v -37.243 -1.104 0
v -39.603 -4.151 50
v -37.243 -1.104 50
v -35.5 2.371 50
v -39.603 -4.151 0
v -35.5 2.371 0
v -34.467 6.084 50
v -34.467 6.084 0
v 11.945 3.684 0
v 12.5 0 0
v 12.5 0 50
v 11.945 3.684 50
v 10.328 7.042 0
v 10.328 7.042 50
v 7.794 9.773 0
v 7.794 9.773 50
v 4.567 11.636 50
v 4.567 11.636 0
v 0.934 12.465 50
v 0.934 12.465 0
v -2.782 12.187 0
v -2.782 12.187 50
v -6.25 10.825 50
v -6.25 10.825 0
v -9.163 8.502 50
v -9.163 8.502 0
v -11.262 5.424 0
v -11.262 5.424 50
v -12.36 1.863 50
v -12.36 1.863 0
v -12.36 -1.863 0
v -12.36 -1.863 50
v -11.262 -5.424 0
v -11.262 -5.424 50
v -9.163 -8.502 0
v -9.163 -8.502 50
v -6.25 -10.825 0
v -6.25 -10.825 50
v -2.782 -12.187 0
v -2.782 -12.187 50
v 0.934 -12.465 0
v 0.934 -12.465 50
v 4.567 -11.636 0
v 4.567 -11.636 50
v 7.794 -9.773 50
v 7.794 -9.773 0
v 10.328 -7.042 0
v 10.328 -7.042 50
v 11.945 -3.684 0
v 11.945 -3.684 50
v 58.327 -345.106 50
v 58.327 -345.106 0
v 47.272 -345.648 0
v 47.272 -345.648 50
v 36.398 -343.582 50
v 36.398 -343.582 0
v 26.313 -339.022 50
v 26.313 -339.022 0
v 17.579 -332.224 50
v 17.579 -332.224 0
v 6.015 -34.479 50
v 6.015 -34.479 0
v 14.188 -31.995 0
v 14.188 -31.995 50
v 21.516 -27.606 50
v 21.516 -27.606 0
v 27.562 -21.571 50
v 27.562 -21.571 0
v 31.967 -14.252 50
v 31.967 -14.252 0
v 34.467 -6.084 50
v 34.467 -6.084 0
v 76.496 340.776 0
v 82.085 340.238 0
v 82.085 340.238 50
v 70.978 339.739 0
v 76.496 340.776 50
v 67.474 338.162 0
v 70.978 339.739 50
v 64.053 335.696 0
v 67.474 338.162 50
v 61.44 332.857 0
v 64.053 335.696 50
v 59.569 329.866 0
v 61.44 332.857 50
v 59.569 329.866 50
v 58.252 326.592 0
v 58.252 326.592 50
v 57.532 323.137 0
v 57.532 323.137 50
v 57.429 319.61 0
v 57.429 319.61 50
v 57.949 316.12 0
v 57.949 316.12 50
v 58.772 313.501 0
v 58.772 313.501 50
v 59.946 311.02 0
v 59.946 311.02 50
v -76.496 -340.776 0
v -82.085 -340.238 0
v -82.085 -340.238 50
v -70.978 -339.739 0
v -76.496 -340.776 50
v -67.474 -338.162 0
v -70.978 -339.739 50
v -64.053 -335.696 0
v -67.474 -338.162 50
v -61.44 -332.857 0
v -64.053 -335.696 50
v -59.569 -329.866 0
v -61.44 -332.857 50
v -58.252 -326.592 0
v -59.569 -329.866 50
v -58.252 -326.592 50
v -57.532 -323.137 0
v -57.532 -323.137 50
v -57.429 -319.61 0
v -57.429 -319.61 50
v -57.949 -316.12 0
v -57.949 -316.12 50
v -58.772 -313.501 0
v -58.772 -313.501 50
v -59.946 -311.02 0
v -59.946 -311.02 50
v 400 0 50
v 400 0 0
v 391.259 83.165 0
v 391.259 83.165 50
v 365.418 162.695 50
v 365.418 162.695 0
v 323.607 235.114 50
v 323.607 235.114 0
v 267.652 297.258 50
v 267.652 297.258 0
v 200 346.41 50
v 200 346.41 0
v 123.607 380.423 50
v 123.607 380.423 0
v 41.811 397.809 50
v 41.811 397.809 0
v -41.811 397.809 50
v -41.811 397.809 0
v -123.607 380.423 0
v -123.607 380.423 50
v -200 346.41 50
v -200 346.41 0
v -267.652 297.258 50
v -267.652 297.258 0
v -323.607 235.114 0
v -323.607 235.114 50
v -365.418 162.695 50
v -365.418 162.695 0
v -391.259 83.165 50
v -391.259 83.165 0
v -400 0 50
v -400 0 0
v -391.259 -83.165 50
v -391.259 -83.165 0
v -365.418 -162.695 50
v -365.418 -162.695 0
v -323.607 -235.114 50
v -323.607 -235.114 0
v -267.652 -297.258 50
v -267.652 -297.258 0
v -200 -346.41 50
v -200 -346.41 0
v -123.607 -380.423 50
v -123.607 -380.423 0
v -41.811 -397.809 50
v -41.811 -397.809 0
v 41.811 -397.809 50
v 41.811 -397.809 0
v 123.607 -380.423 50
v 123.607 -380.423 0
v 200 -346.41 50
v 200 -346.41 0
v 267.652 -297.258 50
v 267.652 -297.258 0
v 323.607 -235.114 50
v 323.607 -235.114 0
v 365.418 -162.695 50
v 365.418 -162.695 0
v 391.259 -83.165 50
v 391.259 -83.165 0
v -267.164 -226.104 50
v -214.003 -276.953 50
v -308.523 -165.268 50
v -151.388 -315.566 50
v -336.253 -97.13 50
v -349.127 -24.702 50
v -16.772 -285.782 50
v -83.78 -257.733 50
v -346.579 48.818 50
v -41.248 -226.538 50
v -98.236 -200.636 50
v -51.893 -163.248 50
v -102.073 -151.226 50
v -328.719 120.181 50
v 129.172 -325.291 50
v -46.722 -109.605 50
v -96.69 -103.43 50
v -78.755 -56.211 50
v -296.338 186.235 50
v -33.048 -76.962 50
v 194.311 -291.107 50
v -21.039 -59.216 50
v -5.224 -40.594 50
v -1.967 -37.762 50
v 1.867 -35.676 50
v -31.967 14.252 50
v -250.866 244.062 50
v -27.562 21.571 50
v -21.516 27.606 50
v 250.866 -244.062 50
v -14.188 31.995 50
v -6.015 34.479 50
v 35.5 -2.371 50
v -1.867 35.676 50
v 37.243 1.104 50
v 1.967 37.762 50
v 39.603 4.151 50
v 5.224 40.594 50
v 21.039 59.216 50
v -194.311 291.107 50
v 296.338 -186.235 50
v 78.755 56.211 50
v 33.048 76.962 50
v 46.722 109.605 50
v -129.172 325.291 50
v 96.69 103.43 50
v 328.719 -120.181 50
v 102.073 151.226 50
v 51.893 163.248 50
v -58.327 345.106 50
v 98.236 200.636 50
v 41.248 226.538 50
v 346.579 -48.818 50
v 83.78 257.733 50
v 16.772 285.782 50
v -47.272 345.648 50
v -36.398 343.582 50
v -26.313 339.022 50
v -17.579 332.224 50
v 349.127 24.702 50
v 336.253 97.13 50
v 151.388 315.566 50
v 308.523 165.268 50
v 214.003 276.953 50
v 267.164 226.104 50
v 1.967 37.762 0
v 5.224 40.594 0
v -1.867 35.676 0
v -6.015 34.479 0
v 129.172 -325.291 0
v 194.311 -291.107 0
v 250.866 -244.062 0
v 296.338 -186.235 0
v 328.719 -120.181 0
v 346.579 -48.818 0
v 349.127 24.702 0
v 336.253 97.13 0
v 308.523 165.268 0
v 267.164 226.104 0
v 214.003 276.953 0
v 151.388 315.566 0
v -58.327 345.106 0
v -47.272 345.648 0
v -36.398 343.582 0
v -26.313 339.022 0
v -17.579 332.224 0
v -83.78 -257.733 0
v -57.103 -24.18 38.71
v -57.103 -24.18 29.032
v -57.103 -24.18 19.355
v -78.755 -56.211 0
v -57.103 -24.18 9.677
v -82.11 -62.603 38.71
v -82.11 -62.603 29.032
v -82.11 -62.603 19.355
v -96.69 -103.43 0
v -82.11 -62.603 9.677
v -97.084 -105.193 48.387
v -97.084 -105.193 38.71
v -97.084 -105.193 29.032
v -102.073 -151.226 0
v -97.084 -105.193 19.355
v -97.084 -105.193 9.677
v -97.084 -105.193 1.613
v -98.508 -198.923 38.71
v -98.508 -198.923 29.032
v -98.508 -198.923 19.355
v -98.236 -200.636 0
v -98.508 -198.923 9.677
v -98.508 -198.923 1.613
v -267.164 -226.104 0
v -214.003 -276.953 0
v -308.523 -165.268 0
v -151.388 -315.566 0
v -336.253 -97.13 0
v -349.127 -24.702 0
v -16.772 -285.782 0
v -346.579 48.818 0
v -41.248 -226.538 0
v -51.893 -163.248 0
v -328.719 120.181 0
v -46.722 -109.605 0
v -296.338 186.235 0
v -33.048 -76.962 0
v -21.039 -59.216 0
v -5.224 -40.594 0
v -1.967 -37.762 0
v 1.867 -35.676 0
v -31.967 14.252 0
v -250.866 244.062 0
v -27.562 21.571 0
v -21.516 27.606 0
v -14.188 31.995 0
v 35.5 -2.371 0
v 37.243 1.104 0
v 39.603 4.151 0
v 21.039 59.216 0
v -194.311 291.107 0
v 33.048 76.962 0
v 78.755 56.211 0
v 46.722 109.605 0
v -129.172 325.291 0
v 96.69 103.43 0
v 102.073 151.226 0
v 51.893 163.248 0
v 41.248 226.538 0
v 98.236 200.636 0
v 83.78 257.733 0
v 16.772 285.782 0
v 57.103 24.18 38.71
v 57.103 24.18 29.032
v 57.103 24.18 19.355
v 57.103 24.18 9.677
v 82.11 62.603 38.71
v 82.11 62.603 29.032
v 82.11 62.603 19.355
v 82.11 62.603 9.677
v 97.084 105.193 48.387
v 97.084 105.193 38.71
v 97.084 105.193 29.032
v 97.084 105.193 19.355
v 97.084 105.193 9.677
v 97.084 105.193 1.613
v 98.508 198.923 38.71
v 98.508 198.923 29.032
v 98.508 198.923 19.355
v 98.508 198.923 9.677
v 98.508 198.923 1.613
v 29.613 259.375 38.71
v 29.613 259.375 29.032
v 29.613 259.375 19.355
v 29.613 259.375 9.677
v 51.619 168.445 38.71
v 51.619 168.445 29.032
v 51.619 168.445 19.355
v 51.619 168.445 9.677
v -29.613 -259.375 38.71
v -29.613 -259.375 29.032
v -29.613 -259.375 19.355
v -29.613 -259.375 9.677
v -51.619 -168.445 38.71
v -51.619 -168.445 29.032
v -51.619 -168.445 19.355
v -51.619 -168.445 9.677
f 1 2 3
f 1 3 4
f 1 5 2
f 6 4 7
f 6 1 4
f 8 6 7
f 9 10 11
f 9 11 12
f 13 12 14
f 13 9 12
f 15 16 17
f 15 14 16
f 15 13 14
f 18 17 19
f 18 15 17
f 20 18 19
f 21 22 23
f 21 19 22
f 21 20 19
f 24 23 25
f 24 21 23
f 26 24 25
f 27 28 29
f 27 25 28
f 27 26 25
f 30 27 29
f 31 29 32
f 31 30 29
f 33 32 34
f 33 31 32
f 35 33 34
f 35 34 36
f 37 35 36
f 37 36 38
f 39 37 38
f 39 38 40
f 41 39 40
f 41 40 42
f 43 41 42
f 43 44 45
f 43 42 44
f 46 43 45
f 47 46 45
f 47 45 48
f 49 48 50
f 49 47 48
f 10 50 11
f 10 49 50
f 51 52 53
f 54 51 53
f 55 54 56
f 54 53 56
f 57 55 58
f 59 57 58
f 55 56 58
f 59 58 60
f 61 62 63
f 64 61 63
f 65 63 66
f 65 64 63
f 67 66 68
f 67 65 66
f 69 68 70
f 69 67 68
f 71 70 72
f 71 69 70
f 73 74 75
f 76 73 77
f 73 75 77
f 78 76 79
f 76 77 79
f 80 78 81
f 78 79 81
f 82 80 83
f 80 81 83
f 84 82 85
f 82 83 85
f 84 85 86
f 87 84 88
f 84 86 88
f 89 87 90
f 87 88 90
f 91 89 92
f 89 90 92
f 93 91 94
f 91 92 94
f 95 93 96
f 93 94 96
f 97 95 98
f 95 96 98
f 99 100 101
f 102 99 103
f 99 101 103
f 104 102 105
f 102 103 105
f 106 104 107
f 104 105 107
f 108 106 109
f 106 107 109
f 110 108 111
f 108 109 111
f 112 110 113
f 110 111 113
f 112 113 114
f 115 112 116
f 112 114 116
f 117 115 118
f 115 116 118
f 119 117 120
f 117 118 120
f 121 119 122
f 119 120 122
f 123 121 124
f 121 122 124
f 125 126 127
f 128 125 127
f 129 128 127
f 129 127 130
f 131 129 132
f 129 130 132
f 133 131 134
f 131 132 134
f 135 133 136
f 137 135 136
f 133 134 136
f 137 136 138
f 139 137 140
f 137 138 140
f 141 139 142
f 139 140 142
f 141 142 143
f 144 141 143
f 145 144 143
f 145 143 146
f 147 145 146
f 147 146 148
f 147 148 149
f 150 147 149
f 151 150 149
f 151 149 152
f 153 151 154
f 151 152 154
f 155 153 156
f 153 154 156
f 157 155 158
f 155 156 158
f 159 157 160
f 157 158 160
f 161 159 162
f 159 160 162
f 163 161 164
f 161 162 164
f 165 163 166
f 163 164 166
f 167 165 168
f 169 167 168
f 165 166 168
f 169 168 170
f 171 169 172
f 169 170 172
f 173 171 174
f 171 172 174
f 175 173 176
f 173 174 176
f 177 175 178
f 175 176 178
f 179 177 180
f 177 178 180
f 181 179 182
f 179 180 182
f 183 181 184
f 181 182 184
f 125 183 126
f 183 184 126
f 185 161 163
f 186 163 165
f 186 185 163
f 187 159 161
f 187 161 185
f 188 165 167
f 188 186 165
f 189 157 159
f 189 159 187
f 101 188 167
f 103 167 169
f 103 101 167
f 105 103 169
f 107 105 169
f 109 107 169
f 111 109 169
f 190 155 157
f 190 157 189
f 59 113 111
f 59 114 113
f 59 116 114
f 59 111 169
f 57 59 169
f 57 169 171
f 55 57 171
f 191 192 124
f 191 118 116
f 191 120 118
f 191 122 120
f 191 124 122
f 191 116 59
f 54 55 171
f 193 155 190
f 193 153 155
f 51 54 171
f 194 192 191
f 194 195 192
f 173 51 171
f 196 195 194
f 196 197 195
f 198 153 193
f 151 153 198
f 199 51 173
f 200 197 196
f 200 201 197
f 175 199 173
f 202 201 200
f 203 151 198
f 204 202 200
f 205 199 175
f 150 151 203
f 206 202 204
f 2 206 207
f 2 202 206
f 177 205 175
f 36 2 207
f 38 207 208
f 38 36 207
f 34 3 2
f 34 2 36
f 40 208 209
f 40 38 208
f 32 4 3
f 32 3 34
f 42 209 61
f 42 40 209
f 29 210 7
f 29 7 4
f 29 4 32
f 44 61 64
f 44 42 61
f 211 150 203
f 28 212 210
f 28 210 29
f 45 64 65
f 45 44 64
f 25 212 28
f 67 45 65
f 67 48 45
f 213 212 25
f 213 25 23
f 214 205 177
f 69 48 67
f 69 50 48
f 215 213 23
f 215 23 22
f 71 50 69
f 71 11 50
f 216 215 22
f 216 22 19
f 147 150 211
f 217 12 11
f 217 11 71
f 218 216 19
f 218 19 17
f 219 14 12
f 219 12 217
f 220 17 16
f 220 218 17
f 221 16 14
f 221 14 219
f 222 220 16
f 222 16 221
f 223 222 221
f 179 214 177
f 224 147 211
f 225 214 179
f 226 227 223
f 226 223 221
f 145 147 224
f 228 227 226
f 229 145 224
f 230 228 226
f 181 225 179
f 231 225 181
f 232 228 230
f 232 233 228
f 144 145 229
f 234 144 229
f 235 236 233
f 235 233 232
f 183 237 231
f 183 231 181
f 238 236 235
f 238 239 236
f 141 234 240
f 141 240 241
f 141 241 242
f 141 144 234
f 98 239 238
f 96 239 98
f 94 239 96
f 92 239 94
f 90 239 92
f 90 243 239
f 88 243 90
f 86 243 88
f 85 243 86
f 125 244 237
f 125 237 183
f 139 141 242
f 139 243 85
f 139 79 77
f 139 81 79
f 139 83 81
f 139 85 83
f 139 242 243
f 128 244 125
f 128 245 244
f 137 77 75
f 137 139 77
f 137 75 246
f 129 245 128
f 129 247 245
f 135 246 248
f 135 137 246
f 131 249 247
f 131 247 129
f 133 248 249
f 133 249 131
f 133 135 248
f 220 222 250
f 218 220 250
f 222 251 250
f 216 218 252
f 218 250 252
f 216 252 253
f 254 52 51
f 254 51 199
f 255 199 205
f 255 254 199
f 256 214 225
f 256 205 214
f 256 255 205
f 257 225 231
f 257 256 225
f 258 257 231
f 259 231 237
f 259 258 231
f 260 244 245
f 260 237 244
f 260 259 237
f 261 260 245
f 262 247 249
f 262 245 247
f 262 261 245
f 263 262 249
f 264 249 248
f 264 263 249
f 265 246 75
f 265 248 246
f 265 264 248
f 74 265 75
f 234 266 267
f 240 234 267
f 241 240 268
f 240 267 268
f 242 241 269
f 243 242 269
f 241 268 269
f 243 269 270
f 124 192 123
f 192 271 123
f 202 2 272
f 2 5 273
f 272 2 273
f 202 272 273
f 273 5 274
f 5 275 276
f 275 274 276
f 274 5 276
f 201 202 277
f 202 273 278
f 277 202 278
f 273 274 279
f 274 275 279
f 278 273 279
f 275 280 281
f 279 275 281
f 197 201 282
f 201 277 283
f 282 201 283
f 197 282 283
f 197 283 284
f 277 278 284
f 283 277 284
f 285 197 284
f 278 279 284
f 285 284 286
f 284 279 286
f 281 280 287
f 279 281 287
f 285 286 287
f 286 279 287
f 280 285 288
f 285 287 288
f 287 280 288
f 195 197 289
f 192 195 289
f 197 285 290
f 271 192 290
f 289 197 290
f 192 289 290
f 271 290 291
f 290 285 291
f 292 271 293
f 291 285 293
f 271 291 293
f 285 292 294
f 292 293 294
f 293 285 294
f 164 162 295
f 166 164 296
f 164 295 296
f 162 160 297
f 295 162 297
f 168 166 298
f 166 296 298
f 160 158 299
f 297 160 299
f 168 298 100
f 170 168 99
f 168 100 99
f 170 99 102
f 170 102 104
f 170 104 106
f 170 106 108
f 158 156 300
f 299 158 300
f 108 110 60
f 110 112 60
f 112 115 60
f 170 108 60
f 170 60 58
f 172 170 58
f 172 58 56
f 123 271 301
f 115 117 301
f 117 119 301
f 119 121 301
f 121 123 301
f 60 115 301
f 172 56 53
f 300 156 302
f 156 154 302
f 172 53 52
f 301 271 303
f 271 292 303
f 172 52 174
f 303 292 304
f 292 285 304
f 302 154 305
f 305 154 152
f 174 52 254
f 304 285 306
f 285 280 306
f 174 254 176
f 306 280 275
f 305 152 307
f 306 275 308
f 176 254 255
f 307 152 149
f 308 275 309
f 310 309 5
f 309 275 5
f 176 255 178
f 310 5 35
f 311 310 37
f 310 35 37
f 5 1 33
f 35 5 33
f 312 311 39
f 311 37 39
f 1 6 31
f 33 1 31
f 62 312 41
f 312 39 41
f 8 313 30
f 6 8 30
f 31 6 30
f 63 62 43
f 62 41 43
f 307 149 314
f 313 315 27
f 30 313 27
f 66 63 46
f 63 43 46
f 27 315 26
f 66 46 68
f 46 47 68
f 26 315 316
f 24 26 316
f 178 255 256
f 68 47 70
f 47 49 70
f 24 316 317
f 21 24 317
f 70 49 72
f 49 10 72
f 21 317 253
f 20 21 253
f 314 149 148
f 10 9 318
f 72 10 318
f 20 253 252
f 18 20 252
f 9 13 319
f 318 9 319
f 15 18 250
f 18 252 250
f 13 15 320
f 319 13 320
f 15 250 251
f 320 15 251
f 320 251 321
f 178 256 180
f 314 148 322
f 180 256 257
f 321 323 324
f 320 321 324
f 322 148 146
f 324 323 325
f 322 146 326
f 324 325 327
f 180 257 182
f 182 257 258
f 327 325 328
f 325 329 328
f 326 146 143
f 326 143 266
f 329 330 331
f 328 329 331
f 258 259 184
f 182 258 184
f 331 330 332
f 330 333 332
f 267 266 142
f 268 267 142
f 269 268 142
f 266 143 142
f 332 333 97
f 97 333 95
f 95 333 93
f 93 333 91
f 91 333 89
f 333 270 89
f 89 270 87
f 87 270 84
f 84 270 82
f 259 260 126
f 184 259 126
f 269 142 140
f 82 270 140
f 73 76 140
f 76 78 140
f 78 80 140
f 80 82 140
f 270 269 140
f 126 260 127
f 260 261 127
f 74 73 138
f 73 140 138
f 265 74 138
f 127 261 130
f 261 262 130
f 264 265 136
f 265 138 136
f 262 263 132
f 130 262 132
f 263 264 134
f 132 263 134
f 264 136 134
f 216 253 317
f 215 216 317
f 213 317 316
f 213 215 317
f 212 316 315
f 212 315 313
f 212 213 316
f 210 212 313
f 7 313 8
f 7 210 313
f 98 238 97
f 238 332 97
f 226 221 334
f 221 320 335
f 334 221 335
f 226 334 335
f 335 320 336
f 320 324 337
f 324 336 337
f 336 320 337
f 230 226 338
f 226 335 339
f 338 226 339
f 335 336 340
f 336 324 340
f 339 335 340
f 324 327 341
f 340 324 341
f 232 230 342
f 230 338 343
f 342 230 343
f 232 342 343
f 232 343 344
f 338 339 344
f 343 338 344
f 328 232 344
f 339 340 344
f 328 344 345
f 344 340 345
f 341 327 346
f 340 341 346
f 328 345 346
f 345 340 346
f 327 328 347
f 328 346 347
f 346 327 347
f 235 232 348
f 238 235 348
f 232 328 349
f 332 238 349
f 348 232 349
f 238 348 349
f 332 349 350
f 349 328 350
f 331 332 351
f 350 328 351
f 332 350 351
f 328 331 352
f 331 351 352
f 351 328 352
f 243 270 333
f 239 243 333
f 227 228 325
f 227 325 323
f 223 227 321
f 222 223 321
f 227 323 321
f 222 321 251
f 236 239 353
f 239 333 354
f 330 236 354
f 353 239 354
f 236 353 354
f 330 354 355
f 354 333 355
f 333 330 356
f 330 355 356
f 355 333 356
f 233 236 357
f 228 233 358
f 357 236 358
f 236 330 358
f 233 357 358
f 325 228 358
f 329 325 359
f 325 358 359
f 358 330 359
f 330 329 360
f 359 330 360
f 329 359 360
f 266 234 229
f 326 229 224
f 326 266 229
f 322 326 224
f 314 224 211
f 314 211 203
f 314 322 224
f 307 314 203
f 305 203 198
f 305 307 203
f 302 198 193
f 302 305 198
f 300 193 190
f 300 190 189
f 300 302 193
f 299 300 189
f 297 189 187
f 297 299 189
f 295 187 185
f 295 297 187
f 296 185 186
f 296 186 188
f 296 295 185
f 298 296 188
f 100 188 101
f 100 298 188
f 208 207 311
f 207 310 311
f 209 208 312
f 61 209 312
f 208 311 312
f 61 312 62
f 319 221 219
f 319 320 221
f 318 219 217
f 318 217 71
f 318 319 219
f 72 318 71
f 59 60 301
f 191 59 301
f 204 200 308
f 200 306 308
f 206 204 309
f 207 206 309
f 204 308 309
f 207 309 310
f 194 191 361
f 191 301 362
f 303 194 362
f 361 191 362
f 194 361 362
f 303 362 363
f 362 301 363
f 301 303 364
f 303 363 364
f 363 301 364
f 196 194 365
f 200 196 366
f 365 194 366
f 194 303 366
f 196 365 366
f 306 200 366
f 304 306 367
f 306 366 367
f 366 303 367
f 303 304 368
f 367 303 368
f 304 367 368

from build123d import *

# Parameters (mm, degrees)
ESQUISSE1_R                  = 400
ESQUISSE1_R_2                = 350
BOSS_EXTRU_1_DEPTH           = 50
EXTRU_MINCE1_START           = -50
EXTRU_MINCE1_DEPTH           = 50
BOSS_EXTRU_2_START           = -50
BOSS_EXTRU_2_DEPTH           = 50
ENL_V_MAT_EXTRU_1_DEPTH      = 568.89083473
ENL_V_MAT_EXTRU_1_DEPTH_BACK = 568.89083473
ESQUISSE4_R                  = 12.5
ESQUISSE5_R                  = 35
ESQUISSE5_R_2                = 12.5
BOSS_EXTRU_3_DEPTH           = 50
CONG_2_R                     = 20


# Read off the part's stored shape, not the designer's step: Extru.-Mince1
with BuildPart() as part:
    # Esquisse1 → Boss.-Extru.1 (new body)
    with BuildSketch(Plane.XY):
        Circle(ESQUISSE1_R)
        Circle(ESQUISSE1_R_2, mode=Mode.SUBTRACT)
    extrude(amount=BOSS_EXTRU_1_DEPTH)

    # Extru.-Mince1 outline → Extru.-Mince1 (add)
    with BuildSketch(Plane.XY.offset(50).offset(EXTRU_MINCE1_START)):
        with BuildLine():
            add(Edge.make_bspline(
                [(-17.578582702, 332.223795956), (-13.006029397, 327.702076571), (-8.525799104, 322.703406145), (0.139661855, 311.878345733), (4.324902329, 306.052383763), (12.306325082, 293.716264205), (16.102617705, 287.206307092), (23.226392886, 273.652542218), (26.553972592, 266.608809401), (35.730163441, 244.906938456), (40.768636512, 229.677168598), (46.367738516, 206.627670241), (47.908578076, 198.910612565), (50.294392784, 183.568496034), (51.139268661, 175.94345939), (52.098340216, 160.947531132), (52.21238025, 153.576755976), (51.68889352, 139.252087771), (51.051205988, 132.298518999), (49.529565248, 122.298741474), (48.928334221, 119.037172715), (47.539683848, 112.675350651), (46.752582578, 109.576215008), (44.114742474, 100.538037841), (41.977452484, 94.806766085), (36.834878855, 83.551557811), (33.826996348, 78.025173728), (26.773354915, 66.867395642), (22.725430524, 61.236927426), (13.447578047, 49.660158587), (8.217643624, 43.715682454), (-3.507548172, 31.349570896), (-10.001973073, 24.928879975), (-24.829724062, 10.949936653), (-31.984427814, 3.887364914), (-45.291841947, -10.147456059), (-51.445384798, -17.120649798), (-62.760428782, -31.239396452), (-67.921923577, -38.386773856), (-77.204655719, -53.070631299), (-81.323727601, -60.608037124), (-88.444191242, -76.192121488), (-91.442984134, -84.236352462), (-95.084809692, -96.714540413), (-96.153499672, -100.931355257), (-98.014122409, -109.455423671), (-98.80637413, -113.763724761), (-100.790556161, -126.803188246), (-101.590583179, -135.648622106), (-102.243982659, -153.528217171), (-102.097194354, -162.562702654), (-100.936524717, -180.710794438), (-99.922487739, -189.824517197), (-97.092850599, -208.020658997), (-95.277151165, -217.103100248), (-88.710884536, -244.134069098), (-82.844776318, -261.867237944), (-72.075342178, -287.337160454), (-68.156254712, -295.638589688), (-59.690902904, -311.744851476), (-55.14473571, -319.549758973), (-45.517052393, -334.430345572), (-40.444476295, -341.515238116), (-35.080643578, -348.237488571)],
                knots=[0, 0, 0, 0, 0.0625, 0.0625, 0.125, 0.125, 0.1875, 0.1875, 0.25, 0.25, 0.375, 0.375, 0.4375, 0.4375, 0.5, 0.5, 0.5625, 0.5625, 0.625, 0.625, 0.65625, 0.65625, 0.6875, 0.6875, 0.75, 0.75, 0.8125, 0.8125, 0.875, 0.875, 0.9375, 0.9375, 1, 1, 1.06716091, 1.06716091, 1.134321821, 1.134321821, 1.201482731, 1.201482731, 1.268643642, 1.268643642, 1.335804552, 1.335804552, 1.369385007, 1.369385007, 1.402965463, 1.402965463, 1.470126373, 1.470126373, 1.537287283, 1.537287283, 1.604448194, 1.604448194, 1.671609104, 1.671609104, 1.805930925, 1.805930925, 1.873091836, 1.873091836, 1.940252746, 1.940252746, 2.00642831, 2.00642831, 2.00642831, 2.00642831], degree=3))
            ThreePointArc((-35.080643578, -348.237488571), (-17.562445732, -349.559094432), (0, -350))
            Line((0, -350), (17.578582702, -332.223795956))
            add(Edge.make_bspline(
                [(17.578582702, -332.223795956), (13.006029397, -327.702076571), (8.525799104, -322.703406145), (-0.139661855, -311.878345733), (-4.324902329, -306.052383763), (-12.306325082, -293.716264205), (-16.102617705, -287.206307092), (-23.226392886, -273.652542218), (-26.553972592, -266.608809401), (-35.730163441, -244.906938456), (-40.768636512, -229.677168598), (-46.367738516, -206.627670241), (-47.908578076, -198.910612565), (-50.294392784, -183.568496034), (-51.139268661, -175.94345939), (-52.098340216, -160.947531132), (-52.21238025, -153.576755976), (-51.68889352, -139.252087771), (-51.051205988, -132.298518999), (-49.529565248, -122.298741474), (-48.928334221, -119.037172715), (-47.539683848, -112.675350651), (-46.752582578, -109.576215008), (-44.114742474, -100.538037841), (-41.977452484, -94.806766085), (-36.834878855, -83.551557811), (-33.826996348, -78.025173728), (-26.773354915, -66.867395642), (-22.725430524, -61.236927426), (-13.447578047, -49.660158587), (-8.217643624, -43.715682454), (3.507548172, -31.349570896), (10.001973073, -24.928879975), (24.829724062, -10.949936653), (31.984427814, -3.887364914), (45.291841947, 10.147456059), (51.445384798, 17.120649798), (62.760428782, 31.239396452), (67.921923577, 38.386773856), (77.204655719, 53.070631299), (81.323727601, 60.608037124), (88.444191242, 76.192121488), (91.442984134, 84.236352462), (95.084809692, 96.714540413), (96.153499672, 100.931355257), (98.014122409, 109.455423671), (98.80637413, 113.763724761), (100.790556161, 126.803188246), (101.590583179, 135.648622106), (102.243982659, 153.528217171), (102.097194354, 162.562702654), (100.936524717, 180.710794438), (99.922487739, 189.824517197), (97.092850599, 208.020658997), (95.277151165, 217.103100248), (88.710884536, 244.134069098), (82.844776318, 261.867237944), (72.075342178, 287.337160454), (68.156254712, 295.638589688), (59.690902904, 311.744851476), (55.14473571, 319.549758973), (45.517052393, 334.430345572), (40.444476295, 341.515238116), (35.080643578, 348.237488571)],
                knots=[0, 0, 0, 0, 0.0625, 0.0625, 0.125, 0.125, 0.1875, 0.1875, 0.25, 0.25, 0.375, 0.375, 0.4375, 0.4375, 0.5, 0.5, 0.5625, 0.5625, 0.625, 0.625, 0.65625, 0.65625, 0.6875, 0.6875, 0.75, 0.75, 0.8125, 0.8125, 0.875, 0.875, 0.9375, 0.9375, 1, 1, 1.06716091, 1.06716091, 1.134321821, 1.134321821, 1.201482731, 1.201482731, 1.268643642, 1.268643642, 1.335804552, 1.335804552, 1.369385007, 1.369385007, 1.402965463, 1.402965463, 1.470126373, 1.470126373, 1.537287283, 1.537287283, 1.604448194, 1.604448194, 1.671609104, 1.671609104, 1.805930925, 1.805930925, 1.873091836, 1.873091836, 1.940252746, 1.940252746, 2.00642831, 2.00642831, 2.00642831, 2.00642831], degree=3))
            ThreePointArc((35.080643578, 348.237488571), (17.562445732, 349.559094432), (0, 350))
            Line((0, 350), (-17.578582702, 332.223795956))
        make_face()
    extrude(amount=EXTRU_MINCE1_DEPTH)

    # Esquisse3 → Boss.-Extru.2 (add)
    with BuildSketch(Plane.XY.offset(50).offset(BOSS_EXTRU_2_START)):
        with BuildLine():
            Line((-17.578582702, 332.223795956), (0, 350))
            ThreePointArc((0, 350), (-29.266098764, 348.774275805), (-58.327213726, 345.105688361))
            ThreePointArc((-58.327213726, 345.105688361), (-36.398453128, 343.581838752), (-17.578582702, 332.223795956))
        make_face()
        with BuildLine():
            Line((17.578582702, -332.223795956), (0, -350))
            ThreePointArc((0, -350), (29.266098764, -348.774275805), (58.327213726, -345.105688361))
            ThreePointArc((58.327213726, -345.105688361), (36.398453128, -343.581838752), (17.578582702, -332.223795956))
        make_face()
    extrude(amount=BOSS_EXTRU_2_DEPTH)

    # Esquisse4 → Enlèv. mat.-Extru.1 (cut, two sides: drawn at the far end of the back side and taken through both)
    with BuildSketch(Plane.XY.offset(50).offset(-ENL_V_MAT_EXTRU_1_DEPTH_BACK)):
        Circle(ESQUISSE4_R)
    extrude(amount=ENL_V_MAT_EXTRU_1_DEPTH + ENL_V_MAT_EXTRU_1_DEPTH_BACK, mode=Mode.SUBTRACT)

    # Esquisse5 → Boss.-Extru.3 (add)
    with BuildSketch(Plane.XY.offset(50)):
        Circle(ESQUISSE5_R)
        Circle(ESQUISSE5_R_2, mode=Mode.SUBTRACT)
    extrude(amount=-BOSS_EXTRU_3_DEPTH)

    # Congé2
    cong_2_edges = [part.edges().sort_by_distance(p)[0] for p in [
        (35.080643578, 348.237488571, 25),
        (-35.080643578, -348.237488571, 25),
        (34.993639035, -0.667253389, 25),
        (0.068739934, -34.999932497, 25),
        (-0.068739934, 34.999932497, 25),
        (-34.993639035, 0.667253389, 25),
    ]]
    fillet(cong_2_edges, radius=CONG_2_R)


solid = part.part
